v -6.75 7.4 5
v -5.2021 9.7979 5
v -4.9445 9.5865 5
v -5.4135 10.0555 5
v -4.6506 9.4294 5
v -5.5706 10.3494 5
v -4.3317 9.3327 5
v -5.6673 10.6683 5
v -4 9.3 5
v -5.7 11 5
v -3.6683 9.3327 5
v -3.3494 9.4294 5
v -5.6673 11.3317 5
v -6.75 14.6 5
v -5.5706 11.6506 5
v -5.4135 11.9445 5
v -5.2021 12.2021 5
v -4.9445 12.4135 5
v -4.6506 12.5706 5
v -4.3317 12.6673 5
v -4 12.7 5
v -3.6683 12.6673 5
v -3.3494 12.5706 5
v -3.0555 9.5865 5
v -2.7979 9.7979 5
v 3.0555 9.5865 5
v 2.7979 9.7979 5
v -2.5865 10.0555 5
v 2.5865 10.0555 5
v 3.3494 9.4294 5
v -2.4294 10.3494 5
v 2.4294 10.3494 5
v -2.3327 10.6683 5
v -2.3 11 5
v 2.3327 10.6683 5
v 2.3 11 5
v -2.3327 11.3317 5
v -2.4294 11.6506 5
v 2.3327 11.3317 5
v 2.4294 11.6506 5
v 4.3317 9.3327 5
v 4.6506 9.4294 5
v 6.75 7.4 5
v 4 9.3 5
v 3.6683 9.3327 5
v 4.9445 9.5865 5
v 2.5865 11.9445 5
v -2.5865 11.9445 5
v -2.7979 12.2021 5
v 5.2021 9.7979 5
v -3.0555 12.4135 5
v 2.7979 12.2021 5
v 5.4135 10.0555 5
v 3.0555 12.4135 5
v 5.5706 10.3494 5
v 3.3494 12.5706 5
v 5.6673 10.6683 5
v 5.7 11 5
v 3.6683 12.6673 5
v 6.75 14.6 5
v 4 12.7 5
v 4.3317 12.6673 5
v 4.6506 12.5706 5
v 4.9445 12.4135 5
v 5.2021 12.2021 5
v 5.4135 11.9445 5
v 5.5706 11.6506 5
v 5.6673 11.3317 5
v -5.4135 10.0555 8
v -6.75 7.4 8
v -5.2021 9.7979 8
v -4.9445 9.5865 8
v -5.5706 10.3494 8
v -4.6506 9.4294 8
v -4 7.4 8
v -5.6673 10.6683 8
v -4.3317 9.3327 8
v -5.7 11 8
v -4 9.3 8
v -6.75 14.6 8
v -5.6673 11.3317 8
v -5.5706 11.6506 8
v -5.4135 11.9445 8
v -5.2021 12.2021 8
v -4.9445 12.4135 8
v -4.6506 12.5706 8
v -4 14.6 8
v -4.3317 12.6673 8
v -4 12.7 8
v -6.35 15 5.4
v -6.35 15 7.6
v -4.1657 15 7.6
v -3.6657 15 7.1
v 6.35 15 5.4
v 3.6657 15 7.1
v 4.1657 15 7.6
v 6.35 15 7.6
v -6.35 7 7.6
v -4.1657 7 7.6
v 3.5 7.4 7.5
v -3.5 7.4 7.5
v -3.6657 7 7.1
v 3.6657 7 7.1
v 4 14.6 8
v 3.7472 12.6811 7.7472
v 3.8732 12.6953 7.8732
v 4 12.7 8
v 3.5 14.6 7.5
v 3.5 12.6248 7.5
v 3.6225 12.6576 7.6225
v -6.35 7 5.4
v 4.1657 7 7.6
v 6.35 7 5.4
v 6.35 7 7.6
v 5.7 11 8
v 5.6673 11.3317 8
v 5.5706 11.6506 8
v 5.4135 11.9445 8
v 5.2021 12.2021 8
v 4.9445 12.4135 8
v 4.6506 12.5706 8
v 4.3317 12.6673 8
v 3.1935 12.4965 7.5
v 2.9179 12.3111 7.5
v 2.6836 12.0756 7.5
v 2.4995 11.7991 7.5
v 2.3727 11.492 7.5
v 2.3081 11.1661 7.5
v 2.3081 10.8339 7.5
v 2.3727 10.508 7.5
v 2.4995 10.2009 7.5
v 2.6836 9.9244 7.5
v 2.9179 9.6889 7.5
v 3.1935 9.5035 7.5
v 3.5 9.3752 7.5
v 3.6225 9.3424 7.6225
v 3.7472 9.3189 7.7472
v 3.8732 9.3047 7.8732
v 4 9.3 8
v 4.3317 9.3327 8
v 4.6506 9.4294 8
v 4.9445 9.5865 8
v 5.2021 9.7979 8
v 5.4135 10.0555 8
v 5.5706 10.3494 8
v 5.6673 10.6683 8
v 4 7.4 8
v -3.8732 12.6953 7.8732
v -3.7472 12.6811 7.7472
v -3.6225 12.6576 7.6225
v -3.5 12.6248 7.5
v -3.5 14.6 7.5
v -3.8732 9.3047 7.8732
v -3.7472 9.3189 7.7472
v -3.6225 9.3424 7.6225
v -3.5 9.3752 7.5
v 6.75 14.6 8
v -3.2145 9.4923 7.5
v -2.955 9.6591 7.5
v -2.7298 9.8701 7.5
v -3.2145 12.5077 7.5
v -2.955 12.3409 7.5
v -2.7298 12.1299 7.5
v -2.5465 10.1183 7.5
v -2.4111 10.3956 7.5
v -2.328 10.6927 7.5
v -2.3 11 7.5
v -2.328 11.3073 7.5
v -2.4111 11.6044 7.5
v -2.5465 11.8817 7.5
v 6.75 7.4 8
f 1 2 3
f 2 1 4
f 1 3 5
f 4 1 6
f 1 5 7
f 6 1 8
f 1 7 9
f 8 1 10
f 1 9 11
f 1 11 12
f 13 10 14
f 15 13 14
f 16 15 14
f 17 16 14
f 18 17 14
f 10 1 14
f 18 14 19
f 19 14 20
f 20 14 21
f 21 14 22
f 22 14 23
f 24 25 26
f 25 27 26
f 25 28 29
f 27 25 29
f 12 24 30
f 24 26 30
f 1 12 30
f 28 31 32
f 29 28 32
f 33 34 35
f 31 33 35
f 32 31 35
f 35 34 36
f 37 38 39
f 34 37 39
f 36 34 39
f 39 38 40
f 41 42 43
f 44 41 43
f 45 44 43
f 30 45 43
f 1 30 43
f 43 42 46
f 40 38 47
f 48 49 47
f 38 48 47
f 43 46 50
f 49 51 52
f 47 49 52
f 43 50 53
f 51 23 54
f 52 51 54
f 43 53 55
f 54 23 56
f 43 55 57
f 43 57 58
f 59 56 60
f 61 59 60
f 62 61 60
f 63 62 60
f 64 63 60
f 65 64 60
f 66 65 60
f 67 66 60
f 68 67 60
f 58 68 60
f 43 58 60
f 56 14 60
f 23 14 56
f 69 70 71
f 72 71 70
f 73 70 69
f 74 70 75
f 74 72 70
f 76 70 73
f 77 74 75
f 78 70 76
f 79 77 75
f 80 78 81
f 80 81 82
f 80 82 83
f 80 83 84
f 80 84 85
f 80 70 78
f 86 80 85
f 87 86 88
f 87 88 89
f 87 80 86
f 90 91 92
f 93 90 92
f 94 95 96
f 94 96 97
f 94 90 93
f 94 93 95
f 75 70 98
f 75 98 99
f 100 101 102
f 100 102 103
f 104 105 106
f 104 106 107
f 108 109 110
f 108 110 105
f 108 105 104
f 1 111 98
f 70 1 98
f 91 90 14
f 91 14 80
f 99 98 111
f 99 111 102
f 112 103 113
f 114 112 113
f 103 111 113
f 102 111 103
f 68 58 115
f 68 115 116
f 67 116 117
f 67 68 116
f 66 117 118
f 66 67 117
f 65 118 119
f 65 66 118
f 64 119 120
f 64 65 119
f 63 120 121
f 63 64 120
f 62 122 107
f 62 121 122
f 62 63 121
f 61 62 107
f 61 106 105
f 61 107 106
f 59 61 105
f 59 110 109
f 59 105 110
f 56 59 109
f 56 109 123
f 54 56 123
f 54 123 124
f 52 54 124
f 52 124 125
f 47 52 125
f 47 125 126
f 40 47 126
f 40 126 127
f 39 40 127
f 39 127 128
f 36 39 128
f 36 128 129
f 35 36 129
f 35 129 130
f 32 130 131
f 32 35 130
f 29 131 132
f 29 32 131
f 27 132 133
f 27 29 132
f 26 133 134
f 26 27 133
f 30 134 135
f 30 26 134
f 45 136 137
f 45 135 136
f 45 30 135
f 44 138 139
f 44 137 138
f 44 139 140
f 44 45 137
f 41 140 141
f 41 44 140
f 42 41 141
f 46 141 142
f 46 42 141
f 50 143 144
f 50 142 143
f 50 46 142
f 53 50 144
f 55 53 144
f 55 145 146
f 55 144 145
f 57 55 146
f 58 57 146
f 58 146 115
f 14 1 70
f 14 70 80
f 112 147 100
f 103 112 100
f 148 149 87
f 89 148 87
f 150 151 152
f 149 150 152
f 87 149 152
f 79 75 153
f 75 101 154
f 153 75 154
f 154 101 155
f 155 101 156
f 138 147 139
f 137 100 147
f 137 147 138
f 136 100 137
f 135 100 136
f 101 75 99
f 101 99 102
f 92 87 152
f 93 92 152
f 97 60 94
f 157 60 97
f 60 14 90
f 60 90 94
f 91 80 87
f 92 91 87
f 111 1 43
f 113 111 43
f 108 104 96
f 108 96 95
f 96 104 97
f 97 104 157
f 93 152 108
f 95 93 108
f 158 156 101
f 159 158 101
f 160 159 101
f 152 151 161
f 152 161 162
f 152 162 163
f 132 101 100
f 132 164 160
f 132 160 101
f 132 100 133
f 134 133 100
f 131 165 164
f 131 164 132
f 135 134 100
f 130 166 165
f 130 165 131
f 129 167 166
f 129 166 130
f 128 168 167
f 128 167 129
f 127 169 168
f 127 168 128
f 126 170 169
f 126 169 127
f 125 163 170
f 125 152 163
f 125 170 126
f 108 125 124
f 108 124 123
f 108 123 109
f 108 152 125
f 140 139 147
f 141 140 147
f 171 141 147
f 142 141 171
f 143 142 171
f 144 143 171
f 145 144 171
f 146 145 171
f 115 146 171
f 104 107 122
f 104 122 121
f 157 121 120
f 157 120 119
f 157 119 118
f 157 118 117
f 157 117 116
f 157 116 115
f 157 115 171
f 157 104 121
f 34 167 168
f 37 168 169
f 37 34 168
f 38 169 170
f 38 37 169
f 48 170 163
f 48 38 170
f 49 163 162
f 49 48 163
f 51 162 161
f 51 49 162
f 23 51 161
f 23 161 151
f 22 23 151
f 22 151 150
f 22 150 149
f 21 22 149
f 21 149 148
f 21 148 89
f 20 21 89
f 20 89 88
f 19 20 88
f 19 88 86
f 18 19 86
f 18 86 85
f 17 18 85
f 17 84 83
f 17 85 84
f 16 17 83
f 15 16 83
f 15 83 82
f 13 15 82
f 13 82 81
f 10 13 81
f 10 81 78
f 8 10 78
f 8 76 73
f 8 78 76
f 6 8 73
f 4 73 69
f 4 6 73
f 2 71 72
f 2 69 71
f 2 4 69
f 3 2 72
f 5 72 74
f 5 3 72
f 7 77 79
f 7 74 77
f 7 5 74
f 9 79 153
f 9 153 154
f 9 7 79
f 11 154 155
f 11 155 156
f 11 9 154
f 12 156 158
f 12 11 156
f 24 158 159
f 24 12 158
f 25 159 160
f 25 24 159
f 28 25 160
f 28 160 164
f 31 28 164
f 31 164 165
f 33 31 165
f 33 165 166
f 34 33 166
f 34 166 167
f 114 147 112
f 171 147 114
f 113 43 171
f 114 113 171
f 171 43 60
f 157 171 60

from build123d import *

# Parameters (mm, degrees)
CYLINDER003_R     = 1.7
CYLINDER003_DEPTH = 10
CYLINDER002_R     = 1.7
CYLINDER002_DEPTH = 10
BOX003_W          = 8
BOX003_H          = 8
BOX003_DEPTH      = 1.5
CHAMFER001_SIZE   = 0.5
BOX002_W          = 13.5
BOX002_H          = 8
BOX002_DEPTH      = 3
CHAMFER004_SIZE   = 0.4


with BuildPart() as cylinder003:
    # Cylinder003 → Cylinder003 (new body)
    with BuildSketch(Plane(origin=(-4, 11, 0), x_dir=(1, 0, 0), z_dir=(0, 0, 1))):
        Circle(CYLINDER003_R)
    extrude(amount=CYLINDER003_DEPTH)


with BuildPart() as fusion002:
    # Cylinder002 → Cylinder002 (new body)
    with BuildSketch(Plane(origin=(4, 11, 0), x_dir=(1, 0, 0), z_dir=(0, 0, 1))):
        Circle(CYLINDER002_R)
    extrude(amount=CYLINDER002_DEPTH)

    # Fusion002: union Cylinder003
    add(cylinder003.part)


with BuildPart() as chamfer001:
    # Box003 → Box003 (new body)
    with BuildSketch(Plane(origin=(-4, 7, 7.5), x_dir=(1, 0, 0), z_dir=(0, 0, 1))):
        with Locations((4, 4)):
            Rectangle(BOX003_W, BOX003_H)
    extrude(amount=BOX003_DEPTH)

    # Chamfer001
    chamfer001_edges = [chamfer001.edges().sort_by_distance(p)[0] for p in [
        (-4, 11, 7.5),
        (4, 11, 7.5),
    ]]
    chamfer(chamfer001_edges, length=CHAMFER001_SIZE)


with BuildPart() as chamfer004:
    # Box002 → Box002 (new body)
    with BuildSketch(Plane(origin=(-6.75, 7, 5), x_dir=(1, 0, 0), z_dir=(0, 0, 1))):
        with Locations((6.75, 4)):
            Rectangle(BOX002_W, BOX002_H)
    extrude(amount=BOX002_DEPTH)

    # Cut002008023012009006003002006002006002004004003: cut Chamfer001
    add(chamfer001.part, mode=Mode.SUBTRACT)

    # Cut002008023012009006003002006002006002004004004: cut Fusion002
    add(fusion002.part, mode=Mode.SUBTRACT)

    # Chamfer004
    chamfer004_edges = [chamfer004.edges().sort_by_distance(p)[0] for p in [
        (-6.75, 7, 6.5),
        (-6.75, 15, 6.5),
        (6.75, 7, 6.5),
        (5.375, 7, 8),
        (3.75, 7, 7.75),
        (0, 7, 7.5),
        (-3.75, 7, 7.75),
        (-5.375, 7, 8),
        (0, 7, 5),
        (-5.375, 15, 8),
        (6.75, 15, 6.5),
        (5.375, 15, 8),
        (3.75, 15, 7.75),
        (0, 15, 7.5),
        (-3.75, 15, 7.75),
        (0, 15, 5),
    ]]
    chamfer(chamfer004_edges, length=CHAMFER004_SIZE)


solid = chamfer004.part
